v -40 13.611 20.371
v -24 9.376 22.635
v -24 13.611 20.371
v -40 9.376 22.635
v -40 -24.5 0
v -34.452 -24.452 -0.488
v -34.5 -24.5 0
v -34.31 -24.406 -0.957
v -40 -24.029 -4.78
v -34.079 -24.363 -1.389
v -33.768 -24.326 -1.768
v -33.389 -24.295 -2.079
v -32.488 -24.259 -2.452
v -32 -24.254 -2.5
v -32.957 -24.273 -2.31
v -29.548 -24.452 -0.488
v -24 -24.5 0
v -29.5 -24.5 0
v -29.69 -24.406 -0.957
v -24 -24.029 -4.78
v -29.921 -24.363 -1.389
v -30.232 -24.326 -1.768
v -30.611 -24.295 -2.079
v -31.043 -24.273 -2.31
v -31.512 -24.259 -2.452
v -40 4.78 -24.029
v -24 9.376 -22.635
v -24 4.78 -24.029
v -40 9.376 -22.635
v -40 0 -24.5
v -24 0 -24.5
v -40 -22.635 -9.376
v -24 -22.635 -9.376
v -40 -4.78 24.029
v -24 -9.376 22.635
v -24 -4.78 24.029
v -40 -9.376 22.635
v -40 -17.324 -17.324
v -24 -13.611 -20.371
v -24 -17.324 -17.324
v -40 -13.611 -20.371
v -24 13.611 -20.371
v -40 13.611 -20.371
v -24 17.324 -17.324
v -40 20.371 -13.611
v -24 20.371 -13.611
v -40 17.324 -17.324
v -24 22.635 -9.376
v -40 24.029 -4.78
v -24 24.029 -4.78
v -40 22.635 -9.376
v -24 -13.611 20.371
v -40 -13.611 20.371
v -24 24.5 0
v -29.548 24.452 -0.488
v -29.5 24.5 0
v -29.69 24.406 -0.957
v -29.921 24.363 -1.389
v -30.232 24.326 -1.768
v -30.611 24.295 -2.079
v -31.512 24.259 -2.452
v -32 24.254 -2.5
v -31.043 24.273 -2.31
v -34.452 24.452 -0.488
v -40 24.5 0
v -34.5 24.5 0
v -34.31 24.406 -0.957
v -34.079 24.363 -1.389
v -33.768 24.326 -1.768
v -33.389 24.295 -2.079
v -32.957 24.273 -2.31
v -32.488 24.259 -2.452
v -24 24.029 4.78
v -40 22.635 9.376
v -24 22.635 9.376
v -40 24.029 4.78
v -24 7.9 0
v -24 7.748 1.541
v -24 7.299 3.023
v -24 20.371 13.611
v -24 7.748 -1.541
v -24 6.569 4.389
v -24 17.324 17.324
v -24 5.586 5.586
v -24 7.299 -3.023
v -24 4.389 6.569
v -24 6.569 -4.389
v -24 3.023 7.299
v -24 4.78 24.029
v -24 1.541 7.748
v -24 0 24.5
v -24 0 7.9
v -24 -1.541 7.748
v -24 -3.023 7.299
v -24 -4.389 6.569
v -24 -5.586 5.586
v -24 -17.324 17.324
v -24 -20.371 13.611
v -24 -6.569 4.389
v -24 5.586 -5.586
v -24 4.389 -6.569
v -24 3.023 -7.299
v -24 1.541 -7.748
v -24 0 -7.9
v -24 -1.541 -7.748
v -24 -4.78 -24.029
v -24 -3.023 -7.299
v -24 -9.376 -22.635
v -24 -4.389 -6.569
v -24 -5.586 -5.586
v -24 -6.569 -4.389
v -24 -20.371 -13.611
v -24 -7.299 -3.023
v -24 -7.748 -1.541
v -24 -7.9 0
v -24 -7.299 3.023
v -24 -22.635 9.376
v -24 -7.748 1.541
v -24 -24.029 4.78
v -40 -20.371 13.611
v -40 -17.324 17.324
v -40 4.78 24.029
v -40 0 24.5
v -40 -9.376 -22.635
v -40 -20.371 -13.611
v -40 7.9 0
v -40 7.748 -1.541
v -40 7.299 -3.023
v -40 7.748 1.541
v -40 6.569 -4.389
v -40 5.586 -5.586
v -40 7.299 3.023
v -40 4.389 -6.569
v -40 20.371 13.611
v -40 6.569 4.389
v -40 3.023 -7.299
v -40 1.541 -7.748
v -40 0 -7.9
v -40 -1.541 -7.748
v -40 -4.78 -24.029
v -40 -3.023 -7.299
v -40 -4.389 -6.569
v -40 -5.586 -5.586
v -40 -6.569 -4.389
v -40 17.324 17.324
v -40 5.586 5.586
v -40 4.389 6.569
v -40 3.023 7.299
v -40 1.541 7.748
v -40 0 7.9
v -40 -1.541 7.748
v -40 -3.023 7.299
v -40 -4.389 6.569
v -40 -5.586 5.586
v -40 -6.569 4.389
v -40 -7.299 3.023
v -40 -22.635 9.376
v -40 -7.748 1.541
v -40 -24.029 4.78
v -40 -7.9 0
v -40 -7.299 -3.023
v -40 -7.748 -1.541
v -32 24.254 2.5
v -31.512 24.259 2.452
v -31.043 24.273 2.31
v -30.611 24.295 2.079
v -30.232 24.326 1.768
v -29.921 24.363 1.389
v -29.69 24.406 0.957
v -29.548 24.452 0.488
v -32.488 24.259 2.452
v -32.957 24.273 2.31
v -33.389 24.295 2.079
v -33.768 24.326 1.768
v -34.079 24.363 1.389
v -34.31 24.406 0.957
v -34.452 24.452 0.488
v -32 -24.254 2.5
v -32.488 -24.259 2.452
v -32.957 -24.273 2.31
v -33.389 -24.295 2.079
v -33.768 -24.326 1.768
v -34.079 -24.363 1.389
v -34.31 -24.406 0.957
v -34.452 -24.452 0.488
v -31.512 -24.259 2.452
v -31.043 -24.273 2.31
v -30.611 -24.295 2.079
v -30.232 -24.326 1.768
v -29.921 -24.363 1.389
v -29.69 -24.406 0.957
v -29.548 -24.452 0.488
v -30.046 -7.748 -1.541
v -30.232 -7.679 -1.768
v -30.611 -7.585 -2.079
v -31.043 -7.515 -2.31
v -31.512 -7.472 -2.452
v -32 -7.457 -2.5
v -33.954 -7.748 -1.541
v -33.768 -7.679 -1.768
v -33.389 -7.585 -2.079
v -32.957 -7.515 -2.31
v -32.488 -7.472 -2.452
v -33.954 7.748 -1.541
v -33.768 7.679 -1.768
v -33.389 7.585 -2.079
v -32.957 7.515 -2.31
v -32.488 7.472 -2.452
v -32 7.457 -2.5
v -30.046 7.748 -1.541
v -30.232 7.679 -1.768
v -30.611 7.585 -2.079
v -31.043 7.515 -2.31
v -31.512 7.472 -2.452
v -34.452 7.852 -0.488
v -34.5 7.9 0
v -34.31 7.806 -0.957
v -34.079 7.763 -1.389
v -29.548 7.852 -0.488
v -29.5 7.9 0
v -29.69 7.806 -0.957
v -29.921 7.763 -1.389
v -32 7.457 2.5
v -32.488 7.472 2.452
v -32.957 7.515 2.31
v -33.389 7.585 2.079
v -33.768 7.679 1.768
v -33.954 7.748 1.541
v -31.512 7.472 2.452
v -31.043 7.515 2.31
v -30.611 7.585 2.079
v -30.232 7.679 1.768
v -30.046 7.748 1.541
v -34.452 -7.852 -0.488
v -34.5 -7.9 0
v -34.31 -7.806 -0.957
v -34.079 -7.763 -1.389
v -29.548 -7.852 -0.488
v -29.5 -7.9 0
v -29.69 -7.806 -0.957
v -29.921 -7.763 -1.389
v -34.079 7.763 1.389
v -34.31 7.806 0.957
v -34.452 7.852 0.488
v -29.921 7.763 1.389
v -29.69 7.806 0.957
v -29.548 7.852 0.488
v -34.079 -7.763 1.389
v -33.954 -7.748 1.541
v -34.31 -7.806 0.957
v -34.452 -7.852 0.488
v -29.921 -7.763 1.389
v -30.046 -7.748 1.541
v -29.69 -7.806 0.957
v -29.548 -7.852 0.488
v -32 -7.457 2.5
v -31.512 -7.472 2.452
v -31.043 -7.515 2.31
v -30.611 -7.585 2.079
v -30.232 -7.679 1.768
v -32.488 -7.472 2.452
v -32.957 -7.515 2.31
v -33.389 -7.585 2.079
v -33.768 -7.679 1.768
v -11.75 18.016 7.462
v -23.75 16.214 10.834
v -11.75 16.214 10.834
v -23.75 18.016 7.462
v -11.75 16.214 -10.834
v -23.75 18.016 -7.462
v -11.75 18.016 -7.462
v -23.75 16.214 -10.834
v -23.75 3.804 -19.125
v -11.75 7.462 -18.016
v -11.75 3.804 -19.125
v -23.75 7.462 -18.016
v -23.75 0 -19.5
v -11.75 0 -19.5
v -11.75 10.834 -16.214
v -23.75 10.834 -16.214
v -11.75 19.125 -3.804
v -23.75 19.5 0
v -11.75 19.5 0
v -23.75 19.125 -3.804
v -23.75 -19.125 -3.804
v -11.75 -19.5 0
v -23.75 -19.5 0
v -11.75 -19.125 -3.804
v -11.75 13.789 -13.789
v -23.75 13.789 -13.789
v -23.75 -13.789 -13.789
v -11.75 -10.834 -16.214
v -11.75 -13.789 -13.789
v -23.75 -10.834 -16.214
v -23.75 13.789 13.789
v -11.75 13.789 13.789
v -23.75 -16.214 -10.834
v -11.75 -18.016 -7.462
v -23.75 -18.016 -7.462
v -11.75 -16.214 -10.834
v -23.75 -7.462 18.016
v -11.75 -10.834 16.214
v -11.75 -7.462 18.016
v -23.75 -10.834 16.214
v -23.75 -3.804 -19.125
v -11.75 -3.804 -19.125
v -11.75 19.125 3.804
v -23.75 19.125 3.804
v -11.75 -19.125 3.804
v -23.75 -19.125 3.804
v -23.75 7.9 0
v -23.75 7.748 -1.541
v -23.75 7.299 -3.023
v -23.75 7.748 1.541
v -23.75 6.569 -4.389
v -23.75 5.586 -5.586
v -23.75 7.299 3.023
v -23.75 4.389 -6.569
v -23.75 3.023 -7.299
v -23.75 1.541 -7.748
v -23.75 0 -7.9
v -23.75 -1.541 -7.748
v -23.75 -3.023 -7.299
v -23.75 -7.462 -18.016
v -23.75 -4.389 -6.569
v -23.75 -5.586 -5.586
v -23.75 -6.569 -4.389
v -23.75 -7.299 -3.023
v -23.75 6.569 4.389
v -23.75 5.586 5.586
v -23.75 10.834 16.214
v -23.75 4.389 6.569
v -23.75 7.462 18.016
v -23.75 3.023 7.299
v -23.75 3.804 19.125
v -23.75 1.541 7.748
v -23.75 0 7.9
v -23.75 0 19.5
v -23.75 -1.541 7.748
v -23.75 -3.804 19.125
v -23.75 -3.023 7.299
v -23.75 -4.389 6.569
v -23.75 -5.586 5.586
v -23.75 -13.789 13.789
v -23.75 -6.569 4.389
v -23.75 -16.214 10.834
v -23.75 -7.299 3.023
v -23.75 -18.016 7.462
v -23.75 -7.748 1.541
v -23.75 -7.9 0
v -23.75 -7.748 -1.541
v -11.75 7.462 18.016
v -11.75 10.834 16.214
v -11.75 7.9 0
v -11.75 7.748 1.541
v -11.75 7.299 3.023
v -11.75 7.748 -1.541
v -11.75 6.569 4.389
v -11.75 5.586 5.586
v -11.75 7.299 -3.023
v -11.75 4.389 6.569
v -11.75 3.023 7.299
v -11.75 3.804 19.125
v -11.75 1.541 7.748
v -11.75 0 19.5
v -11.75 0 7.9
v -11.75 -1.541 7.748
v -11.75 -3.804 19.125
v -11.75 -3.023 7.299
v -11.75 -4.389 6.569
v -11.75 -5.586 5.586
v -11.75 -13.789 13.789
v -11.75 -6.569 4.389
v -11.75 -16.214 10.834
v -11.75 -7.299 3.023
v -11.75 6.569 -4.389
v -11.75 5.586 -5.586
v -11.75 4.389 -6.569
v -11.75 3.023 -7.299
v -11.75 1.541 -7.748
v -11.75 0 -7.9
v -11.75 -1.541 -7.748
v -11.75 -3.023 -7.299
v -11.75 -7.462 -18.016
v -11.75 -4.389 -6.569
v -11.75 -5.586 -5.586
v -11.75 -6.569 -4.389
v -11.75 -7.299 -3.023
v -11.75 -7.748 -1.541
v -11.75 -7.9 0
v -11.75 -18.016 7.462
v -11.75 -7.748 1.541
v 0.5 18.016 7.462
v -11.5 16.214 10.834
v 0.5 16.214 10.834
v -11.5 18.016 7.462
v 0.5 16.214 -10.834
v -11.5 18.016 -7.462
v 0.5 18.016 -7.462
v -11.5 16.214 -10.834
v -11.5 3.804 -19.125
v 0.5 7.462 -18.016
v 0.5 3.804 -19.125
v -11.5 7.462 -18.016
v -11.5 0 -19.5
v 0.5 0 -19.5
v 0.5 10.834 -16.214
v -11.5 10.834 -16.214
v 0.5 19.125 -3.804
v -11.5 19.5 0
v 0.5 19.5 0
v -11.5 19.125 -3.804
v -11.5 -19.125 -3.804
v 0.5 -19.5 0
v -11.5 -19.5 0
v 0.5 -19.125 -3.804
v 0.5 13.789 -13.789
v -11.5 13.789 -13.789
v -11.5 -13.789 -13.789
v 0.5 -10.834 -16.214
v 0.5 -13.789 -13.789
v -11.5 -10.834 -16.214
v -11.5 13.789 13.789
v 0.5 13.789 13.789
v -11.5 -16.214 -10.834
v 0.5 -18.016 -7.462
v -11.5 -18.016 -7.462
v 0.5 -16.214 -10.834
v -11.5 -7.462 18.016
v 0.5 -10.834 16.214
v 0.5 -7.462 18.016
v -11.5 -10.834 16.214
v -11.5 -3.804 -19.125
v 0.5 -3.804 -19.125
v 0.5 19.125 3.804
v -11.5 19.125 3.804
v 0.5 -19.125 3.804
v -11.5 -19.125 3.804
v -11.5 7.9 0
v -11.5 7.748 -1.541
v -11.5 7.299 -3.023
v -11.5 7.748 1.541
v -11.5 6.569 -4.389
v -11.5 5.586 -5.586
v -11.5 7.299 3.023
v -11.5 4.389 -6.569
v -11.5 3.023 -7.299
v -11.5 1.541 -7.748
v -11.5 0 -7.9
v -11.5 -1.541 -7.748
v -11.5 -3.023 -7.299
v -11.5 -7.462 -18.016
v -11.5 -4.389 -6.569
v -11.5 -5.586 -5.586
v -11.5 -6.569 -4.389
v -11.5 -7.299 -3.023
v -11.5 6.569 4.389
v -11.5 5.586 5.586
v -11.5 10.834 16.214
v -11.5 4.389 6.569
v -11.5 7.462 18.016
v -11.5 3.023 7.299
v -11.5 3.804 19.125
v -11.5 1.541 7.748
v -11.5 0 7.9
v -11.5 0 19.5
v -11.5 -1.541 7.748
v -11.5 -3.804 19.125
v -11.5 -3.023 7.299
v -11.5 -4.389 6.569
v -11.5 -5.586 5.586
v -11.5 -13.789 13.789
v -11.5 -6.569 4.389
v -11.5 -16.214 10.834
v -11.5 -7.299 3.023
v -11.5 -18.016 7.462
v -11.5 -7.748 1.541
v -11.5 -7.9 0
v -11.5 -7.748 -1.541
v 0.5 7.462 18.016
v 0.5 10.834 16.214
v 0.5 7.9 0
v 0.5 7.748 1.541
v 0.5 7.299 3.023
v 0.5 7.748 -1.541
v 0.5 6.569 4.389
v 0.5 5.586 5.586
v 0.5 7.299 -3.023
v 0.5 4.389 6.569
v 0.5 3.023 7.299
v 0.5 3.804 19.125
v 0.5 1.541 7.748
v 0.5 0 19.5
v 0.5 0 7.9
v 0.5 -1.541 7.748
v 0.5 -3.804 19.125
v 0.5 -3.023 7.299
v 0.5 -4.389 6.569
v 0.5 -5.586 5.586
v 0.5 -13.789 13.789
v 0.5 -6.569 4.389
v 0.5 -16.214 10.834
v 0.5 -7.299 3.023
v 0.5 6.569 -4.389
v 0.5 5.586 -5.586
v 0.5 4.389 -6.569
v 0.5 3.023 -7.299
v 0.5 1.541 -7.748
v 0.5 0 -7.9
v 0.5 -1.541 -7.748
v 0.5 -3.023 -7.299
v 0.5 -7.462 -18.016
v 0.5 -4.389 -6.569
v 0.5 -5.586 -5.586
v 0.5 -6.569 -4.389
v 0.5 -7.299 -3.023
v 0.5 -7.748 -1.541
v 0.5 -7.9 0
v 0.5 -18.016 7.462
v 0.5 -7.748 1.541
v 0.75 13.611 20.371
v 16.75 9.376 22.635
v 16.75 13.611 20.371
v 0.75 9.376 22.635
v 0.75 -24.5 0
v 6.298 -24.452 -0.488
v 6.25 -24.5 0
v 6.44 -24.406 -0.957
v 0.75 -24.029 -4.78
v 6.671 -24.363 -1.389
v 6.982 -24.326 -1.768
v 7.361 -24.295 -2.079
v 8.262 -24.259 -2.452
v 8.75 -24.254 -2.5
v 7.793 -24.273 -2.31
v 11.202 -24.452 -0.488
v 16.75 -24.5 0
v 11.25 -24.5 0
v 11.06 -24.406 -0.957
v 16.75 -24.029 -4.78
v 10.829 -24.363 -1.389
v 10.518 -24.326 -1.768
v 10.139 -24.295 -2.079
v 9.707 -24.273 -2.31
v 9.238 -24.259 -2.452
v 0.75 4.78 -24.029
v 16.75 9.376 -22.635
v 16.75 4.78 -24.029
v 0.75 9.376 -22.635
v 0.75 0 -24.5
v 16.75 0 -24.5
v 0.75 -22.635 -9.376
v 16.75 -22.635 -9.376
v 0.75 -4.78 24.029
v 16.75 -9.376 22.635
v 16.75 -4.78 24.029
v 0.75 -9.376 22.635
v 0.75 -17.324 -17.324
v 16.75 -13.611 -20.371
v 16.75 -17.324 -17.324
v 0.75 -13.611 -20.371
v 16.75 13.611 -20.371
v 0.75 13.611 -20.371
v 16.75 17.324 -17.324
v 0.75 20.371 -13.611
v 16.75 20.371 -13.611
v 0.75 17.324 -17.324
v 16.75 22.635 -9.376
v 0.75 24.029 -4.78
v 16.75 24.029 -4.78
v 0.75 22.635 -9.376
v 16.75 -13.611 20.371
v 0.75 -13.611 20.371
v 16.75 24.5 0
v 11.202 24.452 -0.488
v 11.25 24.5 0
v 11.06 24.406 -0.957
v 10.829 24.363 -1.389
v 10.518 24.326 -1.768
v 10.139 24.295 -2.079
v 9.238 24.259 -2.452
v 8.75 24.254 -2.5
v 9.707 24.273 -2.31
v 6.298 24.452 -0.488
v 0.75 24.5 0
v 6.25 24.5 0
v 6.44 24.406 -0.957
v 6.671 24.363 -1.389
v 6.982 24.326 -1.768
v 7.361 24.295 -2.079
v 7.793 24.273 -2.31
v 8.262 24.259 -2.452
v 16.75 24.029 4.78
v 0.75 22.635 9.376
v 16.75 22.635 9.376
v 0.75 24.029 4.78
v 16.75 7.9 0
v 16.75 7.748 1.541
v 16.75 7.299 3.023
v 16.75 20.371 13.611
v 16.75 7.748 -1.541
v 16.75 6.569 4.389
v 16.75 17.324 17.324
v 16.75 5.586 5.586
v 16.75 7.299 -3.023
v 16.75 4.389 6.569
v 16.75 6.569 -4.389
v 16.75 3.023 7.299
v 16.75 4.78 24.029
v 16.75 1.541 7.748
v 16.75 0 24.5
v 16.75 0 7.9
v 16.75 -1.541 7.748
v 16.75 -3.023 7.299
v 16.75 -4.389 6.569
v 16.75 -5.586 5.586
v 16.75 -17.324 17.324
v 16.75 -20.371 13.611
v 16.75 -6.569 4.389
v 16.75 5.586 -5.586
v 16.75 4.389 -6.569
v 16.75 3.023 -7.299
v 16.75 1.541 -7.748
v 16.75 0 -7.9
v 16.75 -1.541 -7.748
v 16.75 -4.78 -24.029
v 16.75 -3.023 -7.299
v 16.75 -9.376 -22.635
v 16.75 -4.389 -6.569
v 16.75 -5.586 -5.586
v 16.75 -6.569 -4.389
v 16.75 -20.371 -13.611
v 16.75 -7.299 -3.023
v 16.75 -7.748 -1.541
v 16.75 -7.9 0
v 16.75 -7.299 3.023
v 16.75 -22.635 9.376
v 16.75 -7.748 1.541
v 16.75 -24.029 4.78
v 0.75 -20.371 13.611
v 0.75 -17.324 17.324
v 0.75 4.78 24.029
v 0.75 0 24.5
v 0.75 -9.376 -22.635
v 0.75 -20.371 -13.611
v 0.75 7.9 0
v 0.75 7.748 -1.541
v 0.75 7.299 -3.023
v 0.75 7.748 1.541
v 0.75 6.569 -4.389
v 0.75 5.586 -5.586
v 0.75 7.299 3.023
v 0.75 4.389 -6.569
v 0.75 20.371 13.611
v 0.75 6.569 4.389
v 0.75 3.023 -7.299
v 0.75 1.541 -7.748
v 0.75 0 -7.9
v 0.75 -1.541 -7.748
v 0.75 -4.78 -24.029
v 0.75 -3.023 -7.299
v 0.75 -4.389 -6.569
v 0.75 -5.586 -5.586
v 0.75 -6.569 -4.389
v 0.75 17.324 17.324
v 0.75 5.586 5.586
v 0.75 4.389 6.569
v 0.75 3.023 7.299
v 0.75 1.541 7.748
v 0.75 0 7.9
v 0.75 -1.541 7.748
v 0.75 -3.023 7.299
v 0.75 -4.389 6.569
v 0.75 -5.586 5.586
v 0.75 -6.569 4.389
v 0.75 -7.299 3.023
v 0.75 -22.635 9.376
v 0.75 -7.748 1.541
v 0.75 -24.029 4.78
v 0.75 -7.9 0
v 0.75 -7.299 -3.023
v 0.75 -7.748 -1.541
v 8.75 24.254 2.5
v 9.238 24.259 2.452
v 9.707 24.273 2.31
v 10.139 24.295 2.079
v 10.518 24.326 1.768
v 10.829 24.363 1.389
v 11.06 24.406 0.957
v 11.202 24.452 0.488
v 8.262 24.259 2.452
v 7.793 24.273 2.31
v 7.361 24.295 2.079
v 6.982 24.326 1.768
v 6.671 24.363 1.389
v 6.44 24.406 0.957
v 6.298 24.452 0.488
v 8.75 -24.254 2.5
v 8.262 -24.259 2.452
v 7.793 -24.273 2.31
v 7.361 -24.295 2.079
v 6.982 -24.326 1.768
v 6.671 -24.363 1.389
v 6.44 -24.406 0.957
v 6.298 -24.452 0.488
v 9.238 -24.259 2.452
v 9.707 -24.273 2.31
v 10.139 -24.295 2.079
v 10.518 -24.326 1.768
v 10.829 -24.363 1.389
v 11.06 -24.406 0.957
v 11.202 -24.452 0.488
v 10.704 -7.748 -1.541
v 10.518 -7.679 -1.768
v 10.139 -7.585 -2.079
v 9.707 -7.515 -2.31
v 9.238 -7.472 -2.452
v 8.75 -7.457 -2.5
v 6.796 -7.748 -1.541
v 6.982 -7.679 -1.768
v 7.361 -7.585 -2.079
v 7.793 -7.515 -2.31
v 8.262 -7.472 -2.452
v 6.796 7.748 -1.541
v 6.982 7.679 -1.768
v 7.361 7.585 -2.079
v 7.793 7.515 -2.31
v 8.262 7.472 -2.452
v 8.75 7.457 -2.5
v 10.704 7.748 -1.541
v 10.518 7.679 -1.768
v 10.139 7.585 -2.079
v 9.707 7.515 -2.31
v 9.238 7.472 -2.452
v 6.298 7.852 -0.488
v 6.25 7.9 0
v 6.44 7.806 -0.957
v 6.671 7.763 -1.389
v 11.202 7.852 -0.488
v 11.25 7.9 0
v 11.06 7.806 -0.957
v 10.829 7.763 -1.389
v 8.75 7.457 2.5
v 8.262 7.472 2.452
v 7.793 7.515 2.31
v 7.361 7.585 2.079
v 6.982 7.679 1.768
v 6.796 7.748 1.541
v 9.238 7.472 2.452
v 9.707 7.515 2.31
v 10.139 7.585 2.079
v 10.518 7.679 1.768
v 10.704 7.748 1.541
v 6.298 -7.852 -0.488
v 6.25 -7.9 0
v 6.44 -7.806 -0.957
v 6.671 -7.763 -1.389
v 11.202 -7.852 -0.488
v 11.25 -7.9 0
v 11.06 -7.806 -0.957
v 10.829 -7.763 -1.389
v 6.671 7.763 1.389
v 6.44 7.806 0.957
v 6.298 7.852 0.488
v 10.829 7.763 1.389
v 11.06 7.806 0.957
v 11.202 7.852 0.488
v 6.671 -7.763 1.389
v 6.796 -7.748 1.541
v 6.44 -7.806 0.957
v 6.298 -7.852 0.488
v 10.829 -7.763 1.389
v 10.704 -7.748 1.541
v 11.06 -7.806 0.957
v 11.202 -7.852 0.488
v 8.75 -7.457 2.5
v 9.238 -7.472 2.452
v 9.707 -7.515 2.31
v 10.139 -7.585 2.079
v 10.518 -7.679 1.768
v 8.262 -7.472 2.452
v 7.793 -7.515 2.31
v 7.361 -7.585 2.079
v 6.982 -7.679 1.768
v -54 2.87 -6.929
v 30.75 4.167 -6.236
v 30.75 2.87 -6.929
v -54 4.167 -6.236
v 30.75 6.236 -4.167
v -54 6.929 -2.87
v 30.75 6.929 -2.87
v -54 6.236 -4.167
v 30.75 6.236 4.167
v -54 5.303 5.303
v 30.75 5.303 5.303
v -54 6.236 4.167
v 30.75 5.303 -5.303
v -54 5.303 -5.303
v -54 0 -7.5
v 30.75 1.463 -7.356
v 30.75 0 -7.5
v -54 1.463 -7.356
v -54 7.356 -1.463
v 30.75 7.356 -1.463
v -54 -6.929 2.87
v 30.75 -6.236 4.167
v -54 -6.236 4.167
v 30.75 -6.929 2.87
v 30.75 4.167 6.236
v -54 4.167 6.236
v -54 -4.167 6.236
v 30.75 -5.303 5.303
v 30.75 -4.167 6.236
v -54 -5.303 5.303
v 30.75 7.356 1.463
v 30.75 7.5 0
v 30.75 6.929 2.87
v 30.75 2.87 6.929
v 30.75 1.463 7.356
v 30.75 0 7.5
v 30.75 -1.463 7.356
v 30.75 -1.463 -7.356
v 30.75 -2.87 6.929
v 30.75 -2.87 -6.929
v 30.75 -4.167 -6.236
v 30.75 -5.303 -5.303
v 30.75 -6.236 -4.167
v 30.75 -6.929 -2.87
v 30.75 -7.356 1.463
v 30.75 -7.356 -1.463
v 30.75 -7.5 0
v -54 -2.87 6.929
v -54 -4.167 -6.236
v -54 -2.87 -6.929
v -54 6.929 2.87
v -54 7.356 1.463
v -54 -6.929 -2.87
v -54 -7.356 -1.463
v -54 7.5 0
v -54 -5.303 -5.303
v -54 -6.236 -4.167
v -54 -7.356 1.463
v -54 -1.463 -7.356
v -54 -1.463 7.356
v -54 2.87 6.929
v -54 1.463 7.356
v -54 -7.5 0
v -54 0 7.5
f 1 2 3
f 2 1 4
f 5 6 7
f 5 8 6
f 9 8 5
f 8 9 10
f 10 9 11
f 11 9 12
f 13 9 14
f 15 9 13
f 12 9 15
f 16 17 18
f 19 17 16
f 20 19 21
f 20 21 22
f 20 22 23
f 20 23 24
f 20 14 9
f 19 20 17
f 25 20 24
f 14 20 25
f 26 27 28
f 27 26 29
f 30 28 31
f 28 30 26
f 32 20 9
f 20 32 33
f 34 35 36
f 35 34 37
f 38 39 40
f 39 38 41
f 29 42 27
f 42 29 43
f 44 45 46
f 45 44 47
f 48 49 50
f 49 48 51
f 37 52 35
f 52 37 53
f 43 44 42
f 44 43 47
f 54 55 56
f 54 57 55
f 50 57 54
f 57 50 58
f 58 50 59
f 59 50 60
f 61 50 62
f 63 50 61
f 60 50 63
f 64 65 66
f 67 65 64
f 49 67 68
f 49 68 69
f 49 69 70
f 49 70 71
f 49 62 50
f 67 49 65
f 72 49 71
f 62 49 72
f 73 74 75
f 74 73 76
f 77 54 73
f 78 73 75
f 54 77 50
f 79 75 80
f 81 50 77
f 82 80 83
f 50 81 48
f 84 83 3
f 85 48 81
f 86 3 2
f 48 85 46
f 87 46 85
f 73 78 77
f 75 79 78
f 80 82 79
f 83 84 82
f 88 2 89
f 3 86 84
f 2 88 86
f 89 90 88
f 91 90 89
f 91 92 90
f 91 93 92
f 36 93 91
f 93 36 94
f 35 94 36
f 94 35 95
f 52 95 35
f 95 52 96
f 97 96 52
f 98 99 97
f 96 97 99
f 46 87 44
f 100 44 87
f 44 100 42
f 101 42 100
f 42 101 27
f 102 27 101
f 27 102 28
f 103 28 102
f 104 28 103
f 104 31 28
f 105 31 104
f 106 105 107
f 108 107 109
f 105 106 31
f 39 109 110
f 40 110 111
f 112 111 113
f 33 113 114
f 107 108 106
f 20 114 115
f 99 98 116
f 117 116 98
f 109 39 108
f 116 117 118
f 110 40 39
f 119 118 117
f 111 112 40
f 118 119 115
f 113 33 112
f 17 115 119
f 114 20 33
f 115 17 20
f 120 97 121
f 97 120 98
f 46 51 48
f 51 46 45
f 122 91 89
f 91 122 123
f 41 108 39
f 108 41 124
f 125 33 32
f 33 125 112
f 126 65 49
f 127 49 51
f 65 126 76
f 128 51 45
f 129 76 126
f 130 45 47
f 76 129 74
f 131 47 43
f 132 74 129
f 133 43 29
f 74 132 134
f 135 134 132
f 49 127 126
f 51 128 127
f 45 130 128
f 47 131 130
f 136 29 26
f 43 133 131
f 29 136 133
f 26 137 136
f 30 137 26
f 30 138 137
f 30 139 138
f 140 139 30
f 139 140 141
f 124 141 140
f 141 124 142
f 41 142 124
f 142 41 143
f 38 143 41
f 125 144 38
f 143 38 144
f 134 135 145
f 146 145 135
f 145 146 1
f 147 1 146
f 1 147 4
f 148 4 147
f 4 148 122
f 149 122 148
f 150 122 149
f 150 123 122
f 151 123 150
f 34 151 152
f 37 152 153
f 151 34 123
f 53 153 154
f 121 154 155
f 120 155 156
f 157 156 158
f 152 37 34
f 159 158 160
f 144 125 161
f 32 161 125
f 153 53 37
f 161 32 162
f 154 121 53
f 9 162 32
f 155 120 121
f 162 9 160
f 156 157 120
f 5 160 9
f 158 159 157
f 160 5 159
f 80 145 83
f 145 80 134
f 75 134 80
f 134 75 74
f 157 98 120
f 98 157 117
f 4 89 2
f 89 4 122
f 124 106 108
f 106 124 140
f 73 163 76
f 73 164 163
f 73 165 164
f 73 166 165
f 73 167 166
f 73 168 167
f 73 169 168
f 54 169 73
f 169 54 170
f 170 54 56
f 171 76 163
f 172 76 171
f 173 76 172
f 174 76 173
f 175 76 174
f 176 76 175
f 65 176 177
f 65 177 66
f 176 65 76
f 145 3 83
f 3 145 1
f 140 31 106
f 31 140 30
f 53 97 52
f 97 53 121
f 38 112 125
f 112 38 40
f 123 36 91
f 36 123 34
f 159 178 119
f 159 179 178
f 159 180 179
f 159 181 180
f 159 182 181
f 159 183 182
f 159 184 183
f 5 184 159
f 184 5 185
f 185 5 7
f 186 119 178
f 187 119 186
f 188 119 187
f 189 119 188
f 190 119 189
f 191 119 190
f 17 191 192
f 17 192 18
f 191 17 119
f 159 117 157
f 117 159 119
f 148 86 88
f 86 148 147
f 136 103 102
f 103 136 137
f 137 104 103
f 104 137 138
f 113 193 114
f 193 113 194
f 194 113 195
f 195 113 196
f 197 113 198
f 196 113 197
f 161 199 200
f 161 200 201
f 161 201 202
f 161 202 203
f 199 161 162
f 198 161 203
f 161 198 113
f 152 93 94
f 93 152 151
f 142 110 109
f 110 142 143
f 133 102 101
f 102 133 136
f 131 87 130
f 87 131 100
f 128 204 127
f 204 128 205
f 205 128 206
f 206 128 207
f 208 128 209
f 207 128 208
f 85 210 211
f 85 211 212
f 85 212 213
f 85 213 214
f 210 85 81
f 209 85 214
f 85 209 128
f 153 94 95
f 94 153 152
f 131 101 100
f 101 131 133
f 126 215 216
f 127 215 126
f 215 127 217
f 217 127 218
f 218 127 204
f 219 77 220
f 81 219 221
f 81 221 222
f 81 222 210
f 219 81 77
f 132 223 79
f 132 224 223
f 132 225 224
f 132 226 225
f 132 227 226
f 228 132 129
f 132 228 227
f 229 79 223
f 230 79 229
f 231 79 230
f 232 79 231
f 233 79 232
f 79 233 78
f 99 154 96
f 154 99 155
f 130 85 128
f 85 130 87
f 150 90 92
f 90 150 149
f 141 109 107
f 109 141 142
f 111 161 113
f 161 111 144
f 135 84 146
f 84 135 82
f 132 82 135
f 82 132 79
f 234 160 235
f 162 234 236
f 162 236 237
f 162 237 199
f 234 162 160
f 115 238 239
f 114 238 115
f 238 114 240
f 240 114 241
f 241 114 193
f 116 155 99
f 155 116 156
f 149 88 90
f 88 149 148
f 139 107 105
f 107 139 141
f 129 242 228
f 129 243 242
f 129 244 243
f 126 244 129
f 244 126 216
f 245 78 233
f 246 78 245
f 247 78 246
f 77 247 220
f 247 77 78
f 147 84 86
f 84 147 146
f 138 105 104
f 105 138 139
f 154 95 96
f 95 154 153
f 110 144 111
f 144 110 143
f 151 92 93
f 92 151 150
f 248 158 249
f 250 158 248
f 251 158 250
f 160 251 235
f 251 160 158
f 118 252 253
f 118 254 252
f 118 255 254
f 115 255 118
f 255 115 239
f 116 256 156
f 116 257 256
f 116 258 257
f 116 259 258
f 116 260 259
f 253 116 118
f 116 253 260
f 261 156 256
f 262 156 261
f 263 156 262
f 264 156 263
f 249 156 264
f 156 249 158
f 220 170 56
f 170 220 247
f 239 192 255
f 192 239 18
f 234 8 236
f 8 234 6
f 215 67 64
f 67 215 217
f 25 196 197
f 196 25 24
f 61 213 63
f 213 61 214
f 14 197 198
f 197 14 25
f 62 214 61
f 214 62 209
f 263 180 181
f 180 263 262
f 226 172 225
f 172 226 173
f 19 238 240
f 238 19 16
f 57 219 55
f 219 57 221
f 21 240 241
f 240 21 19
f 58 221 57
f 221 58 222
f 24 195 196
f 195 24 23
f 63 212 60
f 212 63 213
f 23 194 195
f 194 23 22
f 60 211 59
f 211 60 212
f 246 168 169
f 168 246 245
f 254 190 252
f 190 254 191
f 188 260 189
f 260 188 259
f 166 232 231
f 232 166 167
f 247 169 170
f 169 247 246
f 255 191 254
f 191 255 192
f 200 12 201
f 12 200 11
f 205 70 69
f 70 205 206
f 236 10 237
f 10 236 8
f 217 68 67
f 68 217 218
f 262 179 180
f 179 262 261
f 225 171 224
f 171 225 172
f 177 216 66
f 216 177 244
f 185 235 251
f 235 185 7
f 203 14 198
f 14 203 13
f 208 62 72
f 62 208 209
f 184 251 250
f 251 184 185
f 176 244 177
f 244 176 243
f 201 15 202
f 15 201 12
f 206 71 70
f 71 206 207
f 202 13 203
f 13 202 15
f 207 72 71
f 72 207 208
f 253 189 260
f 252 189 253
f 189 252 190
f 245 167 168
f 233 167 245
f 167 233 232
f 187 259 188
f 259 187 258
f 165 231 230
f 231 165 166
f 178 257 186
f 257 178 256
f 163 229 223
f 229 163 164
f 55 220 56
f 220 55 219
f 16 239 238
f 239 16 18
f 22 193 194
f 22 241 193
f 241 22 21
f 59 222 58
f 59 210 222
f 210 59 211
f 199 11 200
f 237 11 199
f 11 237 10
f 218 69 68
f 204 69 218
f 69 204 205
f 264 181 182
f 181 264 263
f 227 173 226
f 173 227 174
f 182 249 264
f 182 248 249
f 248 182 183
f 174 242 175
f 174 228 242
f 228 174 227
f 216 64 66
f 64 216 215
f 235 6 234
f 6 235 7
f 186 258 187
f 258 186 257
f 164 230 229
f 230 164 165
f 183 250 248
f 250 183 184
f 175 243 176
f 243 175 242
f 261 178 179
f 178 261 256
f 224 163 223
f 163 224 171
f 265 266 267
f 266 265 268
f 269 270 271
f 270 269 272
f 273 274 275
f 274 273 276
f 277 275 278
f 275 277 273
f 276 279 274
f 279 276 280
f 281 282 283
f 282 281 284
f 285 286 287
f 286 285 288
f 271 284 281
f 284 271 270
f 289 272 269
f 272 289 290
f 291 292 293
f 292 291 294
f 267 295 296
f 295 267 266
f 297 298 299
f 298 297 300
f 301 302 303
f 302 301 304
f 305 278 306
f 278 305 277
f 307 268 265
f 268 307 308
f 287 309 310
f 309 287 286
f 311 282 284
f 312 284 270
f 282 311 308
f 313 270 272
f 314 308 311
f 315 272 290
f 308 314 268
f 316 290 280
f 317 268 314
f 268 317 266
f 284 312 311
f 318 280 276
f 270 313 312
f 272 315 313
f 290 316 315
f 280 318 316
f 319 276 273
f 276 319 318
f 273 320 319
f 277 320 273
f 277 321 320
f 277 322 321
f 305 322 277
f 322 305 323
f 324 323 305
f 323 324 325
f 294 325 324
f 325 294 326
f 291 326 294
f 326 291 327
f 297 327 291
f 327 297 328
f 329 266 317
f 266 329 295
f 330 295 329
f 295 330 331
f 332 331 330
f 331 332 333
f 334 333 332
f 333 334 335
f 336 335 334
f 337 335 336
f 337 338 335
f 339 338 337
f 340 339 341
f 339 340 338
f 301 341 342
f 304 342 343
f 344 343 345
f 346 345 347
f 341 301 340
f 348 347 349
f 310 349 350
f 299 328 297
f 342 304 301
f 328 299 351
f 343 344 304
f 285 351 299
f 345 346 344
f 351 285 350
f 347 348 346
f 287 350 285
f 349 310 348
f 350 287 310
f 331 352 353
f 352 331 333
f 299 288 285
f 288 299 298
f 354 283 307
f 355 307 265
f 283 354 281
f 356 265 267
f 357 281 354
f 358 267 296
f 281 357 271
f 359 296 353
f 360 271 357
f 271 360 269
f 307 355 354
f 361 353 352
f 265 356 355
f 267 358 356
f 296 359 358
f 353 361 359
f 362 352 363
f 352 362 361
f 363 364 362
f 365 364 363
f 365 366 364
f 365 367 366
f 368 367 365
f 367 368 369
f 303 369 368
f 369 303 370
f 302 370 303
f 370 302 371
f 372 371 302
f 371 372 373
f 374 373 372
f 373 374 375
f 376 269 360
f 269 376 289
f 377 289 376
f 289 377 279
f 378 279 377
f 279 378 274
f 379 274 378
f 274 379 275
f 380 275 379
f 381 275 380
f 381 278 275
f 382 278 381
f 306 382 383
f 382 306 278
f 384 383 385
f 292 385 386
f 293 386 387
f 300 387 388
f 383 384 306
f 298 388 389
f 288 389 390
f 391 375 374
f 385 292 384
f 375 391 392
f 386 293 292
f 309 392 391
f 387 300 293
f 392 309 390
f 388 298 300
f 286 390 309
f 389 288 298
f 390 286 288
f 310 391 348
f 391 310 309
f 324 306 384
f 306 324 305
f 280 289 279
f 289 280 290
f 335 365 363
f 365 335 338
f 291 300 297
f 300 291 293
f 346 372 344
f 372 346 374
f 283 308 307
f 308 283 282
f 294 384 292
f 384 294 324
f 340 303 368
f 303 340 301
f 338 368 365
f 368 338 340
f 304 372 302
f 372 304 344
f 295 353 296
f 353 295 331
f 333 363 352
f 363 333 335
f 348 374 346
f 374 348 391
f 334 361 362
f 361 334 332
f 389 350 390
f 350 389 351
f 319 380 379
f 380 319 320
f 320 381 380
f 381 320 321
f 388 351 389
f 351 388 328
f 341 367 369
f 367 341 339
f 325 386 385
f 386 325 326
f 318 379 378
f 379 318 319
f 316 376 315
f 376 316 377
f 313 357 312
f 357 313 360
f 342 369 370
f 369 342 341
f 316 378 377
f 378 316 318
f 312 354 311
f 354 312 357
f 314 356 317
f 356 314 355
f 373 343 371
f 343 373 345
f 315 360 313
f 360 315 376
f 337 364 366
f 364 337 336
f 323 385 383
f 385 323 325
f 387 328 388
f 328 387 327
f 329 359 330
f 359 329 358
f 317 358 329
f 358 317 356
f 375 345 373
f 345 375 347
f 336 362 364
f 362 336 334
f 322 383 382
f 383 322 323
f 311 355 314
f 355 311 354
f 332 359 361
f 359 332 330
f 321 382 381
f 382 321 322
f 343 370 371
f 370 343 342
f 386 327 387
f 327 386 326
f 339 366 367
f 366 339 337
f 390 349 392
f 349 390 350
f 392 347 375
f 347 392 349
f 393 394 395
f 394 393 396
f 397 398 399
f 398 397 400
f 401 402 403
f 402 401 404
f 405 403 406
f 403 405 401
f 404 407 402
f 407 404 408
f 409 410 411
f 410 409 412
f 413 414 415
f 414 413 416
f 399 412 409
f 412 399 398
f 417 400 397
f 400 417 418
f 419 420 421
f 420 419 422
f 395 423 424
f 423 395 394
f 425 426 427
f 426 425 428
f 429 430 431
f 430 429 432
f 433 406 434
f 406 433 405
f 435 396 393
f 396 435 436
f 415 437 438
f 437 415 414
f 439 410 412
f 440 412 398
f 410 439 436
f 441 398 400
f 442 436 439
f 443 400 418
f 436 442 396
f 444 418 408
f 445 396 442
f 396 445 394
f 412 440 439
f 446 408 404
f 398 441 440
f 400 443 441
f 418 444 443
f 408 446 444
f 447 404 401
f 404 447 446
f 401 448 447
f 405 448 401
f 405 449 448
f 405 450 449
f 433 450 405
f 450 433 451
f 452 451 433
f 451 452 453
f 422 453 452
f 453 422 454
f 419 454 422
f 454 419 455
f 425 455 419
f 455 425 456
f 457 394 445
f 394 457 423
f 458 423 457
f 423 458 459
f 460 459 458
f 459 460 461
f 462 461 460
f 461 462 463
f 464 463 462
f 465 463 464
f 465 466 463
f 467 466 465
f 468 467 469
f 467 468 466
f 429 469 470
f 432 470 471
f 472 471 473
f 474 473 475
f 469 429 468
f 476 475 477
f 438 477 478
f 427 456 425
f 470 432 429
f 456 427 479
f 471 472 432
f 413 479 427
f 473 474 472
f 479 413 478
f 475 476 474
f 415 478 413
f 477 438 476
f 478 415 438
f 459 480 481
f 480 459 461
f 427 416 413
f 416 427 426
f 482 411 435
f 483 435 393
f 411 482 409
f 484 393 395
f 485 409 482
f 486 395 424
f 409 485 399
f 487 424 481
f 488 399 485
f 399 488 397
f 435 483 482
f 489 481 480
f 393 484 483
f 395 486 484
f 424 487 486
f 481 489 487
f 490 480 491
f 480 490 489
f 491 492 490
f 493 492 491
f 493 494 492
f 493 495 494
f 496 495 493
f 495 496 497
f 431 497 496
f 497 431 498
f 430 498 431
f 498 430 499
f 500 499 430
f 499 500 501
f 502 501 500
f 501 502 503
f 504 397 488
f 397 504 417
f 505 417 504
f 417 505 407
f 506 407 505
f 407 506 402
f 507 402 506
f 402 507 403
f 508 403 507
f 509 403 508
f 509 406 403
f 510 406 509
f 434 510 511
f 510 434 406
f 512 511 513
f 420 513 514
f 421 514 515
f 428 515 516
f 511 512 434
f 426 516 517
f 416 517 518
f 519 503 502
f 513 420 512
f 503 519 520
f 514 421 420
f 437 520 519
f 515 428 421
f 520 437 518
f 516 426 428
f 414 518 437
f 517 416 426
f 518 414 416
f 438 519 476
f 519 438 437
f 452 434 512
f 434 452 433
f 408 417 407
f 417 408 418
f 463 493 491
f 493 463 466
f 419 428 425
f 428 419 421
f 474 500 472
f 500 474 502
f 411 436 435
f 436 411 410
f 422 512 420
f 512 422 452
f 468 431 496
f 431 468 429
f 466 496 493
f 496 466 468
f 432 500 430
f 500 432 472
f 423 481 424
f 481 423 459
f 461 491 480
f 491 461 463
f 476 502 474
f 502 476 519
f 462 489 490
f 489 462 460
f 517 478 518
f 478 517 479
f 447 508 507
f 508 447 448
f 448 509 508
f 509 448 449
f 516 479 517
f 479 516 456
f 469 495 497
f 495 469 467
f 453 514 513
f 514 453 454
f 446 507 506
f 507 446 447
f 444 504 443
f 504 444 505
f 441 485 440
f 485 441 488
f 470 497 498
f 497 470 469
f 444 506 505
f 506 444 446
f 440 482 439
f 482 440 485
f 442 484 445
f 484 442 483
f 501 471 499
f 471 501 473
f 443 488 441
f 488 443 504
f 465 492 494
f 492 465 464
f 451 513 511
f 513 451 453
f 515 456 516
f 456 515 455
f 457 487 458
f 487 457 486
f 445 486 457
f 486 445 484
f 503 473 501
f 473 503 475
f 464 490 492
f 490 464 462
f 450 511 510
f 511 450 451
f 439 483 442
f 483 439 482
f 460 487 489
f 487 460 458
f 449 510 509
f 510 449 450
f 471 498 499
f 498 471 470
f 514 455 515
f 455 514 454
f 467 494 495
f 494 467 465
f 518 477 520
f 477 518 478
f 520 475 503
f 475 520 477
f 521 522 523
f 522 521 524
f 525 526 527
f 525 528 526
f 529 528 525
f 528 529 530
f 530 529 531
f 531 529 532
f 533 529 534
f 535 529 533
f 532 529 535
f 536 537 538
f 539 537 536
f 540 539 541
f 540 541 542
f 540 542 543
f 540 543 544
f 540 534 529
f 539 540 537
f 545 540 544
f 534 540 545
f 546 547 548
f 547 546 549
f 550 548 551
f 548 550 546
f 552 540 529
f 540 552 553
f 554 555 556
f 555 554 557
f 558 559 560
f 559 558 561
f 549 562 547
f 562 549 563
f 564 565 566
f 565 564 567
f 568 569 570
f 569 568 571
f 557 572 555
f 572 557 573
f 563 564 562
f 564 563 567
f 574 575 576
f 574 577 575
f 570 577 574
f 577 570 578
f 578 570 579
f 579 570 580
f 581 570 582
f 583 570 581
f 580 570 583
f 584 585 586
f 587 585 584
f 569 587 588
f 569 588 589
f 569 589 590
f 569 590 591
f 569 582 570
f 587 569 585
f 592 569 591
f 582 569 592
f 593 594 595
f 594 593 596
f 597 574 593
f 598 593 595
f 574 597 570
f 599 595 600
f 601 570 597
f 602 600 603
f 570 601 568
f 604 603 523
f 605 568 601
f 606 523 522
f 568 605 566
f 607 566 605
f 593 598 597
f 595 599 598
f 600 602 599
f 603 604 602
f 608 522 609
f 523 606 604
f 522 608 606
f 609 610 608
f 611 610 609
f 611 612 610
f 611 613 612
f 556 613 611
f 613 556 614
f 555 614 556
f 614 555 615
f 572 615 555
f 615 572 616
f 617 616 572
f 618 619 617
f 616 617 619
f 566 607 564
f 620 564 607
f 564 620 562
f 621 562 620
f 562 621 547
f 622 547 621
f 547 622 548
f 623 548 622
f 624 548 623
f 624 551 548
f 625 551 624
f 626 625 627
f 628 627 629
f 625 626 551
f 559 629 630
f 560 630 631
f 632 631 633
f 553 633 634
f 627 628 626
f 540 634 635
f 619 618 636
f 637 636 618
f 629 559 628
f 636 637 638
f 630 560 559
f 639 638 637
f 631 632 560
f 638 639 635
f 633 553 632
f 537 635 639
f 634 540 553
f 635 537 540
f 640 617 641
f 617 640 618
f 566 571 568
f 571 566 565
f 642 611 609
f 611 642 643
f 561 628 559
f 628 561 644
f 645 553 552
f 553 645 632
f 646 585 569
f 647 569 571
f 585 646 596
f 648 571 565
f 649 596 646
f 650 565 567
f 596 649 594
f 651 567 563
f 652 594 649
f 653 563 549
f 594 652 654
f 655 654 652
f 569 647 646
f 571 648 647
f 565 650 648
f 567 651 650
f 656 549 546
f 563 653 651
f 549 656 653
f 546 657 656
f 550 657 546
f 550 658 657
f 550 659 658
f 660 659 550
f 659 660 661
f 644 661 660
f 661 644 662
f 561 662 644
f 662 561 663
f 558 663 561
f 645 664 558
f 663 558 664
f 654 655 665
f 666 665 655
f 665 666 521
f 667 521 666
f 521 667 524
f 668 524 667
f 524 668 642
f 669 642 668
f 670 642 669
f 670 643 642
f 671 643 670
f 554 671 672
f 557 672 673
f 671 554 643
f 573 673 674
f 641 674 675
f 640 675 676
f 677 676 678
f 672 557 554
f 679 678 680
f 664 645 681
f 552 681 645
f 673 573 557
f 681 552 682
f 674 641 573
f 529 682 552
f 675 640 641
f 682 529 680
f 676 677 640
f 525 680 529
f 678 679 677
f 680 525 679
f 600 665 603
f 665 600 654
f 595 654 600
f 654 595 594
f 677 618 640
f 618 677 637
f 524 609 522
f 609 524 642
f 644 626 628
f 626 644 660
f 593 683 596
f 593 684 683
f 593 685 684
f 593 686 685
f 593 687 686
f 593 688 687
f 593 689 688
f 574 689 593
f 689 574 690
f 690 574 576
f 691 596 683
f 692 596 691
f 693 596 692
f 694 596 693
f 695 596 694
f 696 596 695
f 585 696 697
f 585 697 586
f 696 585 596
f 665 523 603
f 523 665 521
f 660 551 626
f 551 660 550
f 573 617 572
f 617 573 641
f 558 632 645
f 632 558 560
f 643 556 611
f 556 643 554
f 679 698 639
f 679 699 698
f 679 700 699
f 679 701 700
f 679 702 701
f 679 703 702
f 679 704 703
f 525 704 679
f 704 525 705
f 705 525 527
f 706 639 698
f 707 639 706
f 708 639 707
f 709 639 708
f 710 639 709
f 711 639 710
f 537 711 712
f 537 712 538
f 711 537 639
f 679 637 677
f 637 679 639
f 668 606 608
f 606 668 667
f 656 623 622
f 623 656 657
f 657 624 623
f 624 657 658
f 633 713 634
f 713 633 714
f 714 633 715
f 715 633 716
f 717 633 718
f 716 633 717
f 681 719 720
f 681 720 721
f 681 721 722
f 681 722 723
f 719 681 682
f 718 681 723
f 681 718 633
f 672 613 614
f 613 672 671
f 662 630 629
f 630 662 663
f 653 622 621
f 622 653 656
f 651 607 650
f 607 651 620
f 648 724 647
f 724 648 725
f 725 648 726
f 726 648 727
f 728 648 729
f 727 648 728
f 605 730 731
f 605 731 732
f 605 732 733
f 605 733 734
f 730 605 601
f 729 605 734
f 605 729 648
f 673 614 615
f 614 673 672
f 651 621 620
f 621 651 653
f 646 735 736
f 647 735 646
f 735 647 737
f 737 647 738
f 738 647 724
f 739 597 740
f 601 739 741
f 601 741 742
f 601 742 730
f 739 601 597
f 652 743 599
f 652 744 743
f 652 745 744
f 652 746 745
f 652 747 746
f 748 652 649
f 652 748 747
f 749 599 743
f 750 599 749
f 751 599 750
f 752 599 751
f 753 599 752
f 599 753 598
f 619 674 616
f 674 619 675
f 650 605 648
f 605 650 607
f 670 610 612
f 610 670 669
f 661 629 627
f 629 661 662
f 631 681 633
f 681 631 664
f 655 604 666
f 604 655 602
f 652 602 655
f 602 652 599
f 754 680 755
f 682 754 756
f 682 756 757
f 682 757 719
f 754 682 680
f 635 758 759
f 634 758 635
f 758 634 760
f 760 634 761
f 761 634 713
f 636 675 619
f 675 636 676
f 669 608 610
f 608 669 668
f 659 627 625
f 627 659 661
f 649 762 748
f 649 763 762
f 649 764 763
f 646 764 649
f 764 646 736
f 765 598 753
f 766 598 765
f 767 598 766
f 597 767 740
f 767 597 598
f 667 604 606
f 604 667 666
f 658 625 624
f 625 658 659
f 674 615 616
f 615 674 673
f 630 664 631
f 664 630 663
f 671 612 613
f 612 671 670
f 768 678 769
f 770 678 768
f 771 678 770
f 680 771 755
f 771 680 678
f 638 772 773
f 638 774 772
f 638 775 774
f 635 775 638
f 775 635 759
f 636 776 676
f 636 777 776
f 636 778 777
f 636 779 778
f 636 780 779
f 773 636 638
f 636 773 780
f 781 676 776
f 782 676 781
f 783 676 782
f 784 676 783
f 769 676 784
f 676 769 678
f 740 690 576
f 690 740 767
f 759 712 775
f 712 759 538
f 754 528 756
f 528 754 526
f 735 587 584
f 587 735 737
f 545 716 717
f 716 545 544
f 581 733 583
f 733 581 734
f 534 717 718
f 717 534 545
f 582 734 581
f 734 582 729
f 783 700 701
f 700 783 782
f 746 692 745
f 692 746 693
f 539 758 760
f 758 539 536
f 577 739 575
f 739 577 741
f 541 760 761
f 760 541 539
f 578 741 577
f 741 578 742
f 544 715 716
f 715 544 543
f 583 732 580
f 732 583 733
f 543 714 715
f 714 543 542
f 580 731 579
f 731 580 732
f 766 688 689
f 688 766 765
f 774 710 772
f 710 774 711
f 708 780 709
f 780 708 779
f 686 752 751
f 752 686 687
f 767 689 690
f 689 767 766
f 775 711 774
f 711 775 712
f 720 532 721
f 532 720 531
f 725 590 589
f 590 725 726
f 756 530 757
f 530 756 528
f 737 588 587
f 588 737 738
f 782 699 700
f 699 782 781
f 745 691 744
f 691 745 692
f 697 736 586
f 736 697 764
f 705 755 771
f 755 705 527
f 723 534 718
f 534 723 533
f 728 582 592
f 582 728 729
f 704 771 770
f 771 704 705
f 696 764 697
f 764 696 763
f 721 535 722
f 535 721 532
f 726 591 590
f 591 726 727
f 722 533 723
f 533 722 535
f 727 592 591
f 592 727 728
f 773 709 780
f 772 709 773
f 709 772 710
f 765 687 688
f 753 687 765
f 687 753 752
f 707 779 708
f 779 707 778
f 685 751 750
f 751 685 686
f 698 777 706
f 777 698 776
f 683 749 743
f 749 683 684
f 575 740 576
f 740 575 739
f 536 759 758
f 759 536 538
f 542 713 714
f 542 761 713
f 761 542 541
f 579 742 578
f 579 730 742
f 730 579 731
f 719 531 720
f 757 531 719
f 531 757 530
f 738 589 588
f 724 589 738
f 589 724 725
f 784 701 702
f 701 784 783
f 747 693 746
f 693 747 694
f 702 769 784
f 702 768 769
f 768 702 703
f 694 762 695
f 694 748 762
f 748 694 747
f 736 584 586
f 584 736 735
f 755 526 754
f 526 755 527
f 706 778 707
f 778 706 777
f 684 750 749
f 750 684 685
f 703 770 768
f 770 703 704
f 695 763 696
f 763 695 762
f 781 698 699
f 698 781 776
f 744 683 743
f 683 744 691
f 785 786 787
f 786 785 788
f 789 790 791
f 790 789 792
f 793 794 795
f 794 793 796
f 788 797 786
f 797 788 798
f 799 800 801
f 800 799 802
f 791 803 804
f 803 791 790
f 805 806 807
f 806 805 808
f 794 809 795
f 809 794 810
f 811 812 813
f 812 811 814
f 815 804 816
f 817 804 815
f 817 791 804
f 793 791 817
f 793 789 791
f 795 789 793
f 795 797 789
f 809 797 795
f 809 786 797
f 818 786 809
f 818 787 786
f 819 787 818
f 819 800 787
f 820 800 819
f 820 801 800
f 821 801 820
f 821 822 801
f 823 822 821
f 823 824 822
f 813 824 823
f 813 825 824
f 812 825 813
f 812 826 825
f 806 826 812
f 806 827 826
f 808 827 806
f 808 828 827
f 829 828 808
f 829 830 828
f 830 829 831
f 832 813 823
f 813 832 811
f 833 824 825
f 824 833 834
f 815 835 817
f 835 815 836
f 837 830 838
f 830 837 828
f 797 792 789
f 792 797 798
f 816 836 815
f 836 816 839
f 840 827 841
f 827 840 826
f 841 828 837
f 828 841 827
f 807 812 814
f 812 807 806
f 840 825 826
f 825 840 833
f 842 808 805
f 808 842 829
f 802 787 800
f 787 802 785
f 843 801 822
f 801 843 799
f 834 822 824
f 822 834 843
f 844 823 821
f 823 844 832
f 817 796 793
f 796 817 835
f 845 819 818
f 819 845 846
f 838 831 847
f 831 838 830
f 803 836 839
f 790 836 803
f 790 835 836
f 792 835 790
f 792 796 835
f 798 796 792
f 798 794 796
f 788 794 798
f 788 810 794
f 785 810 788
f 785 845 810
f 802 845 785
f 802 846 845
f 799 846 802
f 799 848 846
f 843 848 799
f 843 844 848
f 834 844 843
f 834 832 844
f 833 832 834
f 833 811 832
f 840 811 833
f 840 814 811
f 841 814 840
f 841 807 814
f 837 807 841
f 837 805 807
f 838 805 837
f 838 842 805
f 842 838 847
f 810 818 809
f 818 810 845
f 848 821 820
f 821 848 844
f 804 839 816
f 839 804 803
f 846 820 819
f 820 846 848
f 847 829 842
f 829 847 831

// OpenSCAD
$fn = 32;

// ------------------------------------------------------------------------
// Shaft with rings and collars: d15 shaft, 4 rings
// Every part is its own module, assembly() places them once.
// ------------------------------------------------------------------------

// --- part 1 ---
module shaft() {
  translate([0, 0, -42.375]) cylinder(h = 84.75, d = 15);
}

// --- part 2 ---
module collar_a() {
  difference() {
    cylinder(h = 16, d = 49);
    translate([0, 0, -1]) cylinder(h = 18, d = 15.8);
    translate([0, 0, 8]) rotate([90, 0, 0]) cylinder(h = 51, d = 5, center = true);
  }
}

// --- part 3 ---
module spacer_a() {
  difference() {
      translate([0, 0, 0]) cylinder(h = 12, d = 39);
      translate([0, 0, -1]) cylinder(h = 14, d = 15.8);
    }
}

// --- part 4 ---
module spacer_b() {
  difference() {
      translate([0, 0, 0]) cylinder(h = 12, d = 39);
      translate([0, 0, -1]) cylinder(h = 14, d = 15.8);
    }
}

// --- part 5 ---
module collar_b() {
  difference() {
    cylinder(h = 16, d = 49);
    translate([0, 0, -1]) cylinder(h = 18, d = 15.8);
    translate([0, 0, 8]) rotate([90, 0, 0]) cylinder(h = 51, d = 5, center = true);
  }
}

// --- assembly ---
module assembly() {
  translate([-11.625, 0, 0]) rotate([0, 90, 0]) shaft();
  translate([-40, 0, 0]) rotate([0, 90, 0]) collar_a();
  translate([-23.75, 0, 0]) rotate([0, 90, 0]) spacer_a();
  translate([-11.5, 0, 0]) rotate([0, 90, 0]) spacer_b();
  translate([0.75, 0, 0]) rotate([0, 90, 0]) collar_b();
}

assembly();
